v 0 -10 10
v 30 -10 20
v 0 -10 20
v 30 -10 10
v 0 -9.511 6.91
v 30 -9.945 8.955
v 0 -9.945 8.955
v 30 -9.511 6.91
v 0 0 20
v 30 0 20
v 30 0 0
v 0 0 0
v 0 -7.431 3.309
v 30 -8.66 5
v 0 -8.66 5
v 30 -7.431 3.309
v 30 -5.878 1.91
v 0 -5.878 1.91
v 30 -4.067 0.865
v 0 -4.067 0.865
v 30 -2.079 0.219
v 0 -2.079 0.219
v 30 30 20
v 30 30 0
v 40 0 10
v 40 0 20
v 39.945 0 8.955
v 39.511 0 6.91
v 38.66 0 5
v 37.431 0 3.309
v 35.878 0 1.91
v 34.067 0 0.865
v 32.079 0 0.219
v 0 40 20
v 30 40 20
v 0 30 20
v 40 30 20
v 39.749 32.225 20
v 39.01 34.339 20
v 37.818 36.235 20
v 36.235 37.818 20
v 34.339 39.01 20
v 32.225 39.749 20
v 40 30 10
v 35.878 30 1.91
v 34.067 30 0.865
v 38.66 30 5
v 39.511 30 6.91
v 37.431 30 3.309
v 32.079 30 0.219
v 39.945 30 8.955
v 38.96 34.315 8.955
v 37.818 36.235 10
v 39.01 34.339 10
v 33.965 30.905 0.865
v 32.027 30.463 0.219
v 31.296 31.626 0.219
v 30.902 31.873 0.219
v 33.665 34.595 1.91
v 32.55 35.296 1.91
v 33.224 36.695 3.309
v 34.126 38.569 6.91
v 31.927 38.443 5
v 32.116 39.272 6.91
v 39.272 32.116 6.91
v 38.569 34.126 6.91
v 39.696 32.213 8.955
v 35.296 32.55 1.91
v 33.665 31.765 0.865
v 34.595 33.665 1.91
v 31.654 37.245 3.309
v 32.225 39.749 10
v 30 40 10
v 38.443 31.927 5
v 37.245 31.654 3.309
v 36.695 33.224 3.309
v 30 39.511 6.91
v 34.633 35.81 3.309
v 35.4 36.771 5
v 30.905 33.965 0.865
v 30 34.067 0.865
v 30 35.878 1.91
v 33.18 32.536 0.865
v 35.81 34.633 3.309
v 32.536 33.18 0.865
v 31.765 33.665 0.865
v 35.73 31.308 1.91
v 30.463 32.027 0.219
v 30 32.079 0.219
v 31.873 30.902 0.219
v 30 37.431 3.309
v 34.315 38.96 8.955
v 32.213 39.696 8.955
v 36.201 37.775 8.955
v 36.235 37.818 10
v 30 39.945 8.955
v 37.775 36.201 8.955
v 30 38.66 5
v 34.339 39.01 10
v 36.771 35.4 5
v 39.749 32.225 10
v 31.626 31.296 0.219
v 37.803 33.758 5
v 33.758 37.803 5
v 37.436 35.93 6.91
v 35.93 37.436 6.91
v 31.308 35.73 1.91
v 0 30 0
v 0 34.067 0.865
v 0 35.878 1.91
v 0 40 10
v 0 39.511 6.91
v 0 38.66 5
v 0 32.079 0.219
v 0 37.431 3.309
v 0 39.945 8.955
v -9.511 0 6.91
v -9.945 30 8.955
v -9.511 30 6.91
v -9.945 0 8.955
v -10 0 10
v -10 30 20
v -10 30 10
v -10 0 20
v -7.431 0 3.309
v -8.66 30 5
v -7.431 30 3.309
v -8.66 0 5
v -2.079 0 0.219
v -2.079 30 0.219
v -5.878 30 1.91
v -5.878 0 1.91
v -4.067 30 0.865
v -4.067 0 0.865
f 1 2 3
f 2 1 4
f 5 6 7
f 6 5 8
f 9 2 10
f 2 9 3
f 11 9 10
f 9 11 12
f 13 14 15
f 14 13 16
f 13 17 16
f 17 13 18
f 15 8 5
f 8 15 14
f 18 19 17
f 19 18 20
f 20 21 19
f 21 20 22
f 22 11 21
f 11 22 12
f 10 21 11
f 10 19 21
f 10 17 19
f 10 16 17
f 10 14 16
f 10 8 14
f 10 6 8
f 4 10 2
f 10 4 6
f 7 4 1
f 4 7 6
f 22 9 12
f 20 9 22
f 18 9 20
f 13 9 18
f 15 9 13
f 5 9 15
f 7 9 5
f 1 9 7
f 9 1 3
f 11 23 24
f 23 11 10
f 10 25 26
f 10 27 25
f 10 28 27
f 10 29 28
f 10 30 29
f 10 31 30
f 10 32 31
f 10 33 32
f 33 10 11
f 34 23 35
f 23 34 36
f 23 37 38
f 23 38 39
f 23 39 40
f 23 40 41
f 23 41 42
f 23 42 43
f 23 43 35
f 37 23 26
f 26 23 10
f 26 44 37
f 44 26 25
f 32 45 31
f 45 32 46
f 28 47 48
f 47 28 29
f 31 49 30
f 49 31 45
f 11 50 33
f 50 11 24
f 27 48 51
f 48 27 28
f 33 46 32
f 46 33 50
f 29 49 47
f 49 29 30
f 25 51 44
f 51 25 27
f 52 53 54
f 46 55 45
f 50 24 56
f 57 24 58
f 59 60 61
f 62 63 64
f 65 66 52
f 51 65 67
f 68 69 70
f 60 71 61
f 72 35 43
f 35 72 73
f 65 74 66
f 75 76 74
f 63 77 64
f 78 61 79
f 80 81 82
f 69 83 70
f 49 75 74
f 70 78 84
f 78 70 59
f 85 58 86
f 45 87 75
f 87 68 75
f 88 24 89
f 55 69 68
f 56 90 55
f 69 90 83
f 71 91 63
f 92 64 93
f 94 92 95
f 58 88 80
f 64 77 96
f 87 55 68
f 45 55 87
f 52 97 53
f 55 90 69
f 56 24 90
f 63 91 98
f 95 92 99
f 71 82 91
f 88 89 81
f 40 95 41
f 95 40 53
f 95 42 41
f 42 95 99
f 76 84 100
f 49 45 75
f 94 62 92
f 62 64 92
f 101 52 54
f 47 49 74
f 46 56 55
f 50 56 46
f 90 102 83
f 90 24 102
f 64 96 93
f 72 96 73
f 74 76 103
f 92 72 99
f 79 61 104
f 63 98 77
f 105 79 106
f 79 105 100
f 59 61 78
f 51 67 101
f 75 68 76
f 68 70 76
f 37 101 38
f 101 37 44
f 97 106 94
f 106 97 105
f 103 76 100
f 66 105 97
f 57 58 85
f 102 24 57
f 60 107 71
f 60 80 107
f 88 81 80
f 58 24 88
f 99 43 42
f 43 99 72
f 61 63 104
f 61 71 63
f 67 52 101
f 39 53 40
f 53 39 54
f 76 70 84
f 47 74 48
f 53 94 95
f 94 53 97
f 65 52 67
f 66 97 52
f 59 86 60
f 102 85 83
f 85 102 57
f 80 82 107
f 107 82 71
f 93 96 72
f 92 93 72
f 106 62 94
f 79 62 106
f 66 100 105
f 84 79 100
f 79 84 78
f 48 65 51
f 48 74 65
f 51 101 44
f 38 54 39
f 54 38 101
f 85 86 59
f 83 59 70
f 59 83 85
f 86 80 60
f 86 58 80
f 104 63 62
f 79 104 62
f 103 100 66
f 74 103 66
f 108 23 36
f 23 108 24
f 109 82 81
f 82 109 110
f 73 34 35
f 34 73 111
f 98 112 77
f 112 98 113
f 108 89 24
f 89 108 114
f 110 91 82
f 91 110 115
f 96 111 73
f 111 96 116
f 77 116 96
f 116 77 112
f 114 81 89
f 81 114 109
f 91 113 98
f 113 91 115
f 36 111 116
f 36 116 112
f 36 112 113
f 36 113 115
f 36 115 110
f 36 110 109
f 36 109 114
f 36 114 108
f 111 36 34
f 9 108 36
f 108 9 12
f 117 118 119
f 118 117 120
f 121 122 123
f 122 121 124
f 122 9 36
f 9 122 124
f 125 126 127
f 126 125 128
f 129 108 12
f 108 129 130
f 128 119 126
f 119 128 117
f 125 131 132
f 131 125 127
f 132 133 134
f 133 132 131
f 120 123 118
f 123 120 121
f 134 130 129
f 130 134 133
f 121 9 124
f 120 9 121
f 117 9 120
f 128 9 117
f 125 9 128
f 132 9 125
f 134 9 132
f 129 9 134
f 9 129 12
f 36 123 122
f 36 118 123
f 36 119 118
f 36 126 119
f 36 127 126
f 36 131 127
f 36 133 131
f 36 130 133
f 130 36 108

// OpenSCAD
// file: origins.scad
module xzy(){
  multmatrix([
    [1,0,0,0],
    [0,0,1,0],
    [0,1,0,0],
  ]) children();
}

module yxz(){
  multmatrix([
    [0,1,0,0],
    [1,0,0,0],
    [0,0,1,0],
  ]) children();
}

module yzx(){
  multmatrix([
    [0,0,1,0],
    [1,0,0,0],
    [0,1,0,0],
  ]) children();
}

module zxy(){
  multmatrix([
    [0,1,0,0],
    [0,0,1,0],
    [1,0,0,0],
  ]) children();
}

module zyx(){
  multmatrix([
    [0,0,1,0],
    [0,1,0,0],
    [1,0,0,0],
  ]) children();
}
// file: sweep.scad
use <origins.scad>

module sweep(path){
  // straight sections
  for(i=[0:len(path)-2]) let(
    p1=path[i],
    p2=path[i+1],
    seg=p2-p1,
    rz=atan2(seg.y,seg.x),
    l=norm(p2-p1)
  ) {
    translate(p1)rotate([0,0,rz])yzx()linear_extrude(l)scale([-1,1])children();
    if (i < len(path)-2) {
      let(p3=path[i+2], seg2=p3-p2, rz_end=atan2(seg2.y,seg2.x),curve_angle=rz_end > rz ? rz_end-rz : rz_end-rz + 360) {
        translate(p2)rotate([0,0,0])rotate_extrude(angle=curve_angle, start=rz-90)children();
      }
    }
  }
}
// file: poly.scad
FILLET="FILLET";
CHAMFER="CHAMFER";

function fillet(point, r) = [expand_fillet, point, [r]];
function chamfer(point, r) = [expand_chamfer, point, [r]];

function _is_expandable(x) = is_list(x) && len(x) == 3;

function _fa(r) = $fn > 3 ? 360 / $fn : $fa; // TODO: involve $fs

function _point(x) = _is_expandable(x) ? x[1] : x;

function _addVec(v1, v2) = [v1.x + v2.x, v1.y + v2.y];

function _rotatePoint(p, a) = [[cos(a), -sin(a)], [sin(a), cos(a)]] * p;

function _vec(p1, p2) = _addVec(-p1, p2) / norm(_addVec(-p1,p2));

function _alpha(p0, p, p2) = (360 + (atan2(p.y-p2.y, p.x-p2.x) - atan2(p.y-p0.y, p.x-p0.x))) % 360;

function _isLeftCorner(p0, p, p2) = (360 + _alpha(p0, p, p2)) % 360 >= 180;

function _offsetPoint(p, p2, d) = _addVec(p, (_vec(p, p2) * d));

function _filletEnd(pp, p, pn, r) = _offsetPoint(p, pp, abs(r / tan(abs(_alpha(pp, p, pn) / 2))));
function _filletCenter(pp, p, pn, r) = _filletEnd(pp, p, pn, r) + _rotatePoint(_vec(p, pp) * r, _isLeftCorner(pp, p, pn) ? -90 : 90);

function _filletCurveAngle(pp, p, pn) = _alpha(pp, p, pn) > 180 ? _alpha(pp, p, pn) - 180 : 180 - _alpha(pp, p, pn);

function _filletPoint(pp, p, pn, r, angle) = _filletCenter(pp, p, pn, r) + _rotatePoint(_vec(pp, p) * r, _isLeftCorner(pp, p, pn) ? angle - 90 : 90 - angle);

function _expandFillet(p0, p, p2, r) = [
  _filletEnd(p0, p, p2, r),
  each [ for (a = [ _fa(r) : _fa(r) : _filletCurveAngle(p0, p,  p2) ]) _filletPoint(p0, p, p2, r, a) ],
  _filletEnd(p2, p, p0, r),
];

expand_fillet = function (p0, p, p2, params) _expandFillet(p0, p, p2, params[0]);

expand_chamfer = function (p0, p, p2, params) [ _offsetPoint(p, p0, params[0]), _offsetPoint(p, p2, params[0]) ];

function _expand(pp, x, pn) = is_function(x[0]) ? x[0](_point(pp), x[1], _point(pn), x[2]) : [x];


module poly(points, paths = undef, convexity = undef) {
  module basic(ps) {
    actualPoints = [ for (i = [0: len(ps)-1]) each _expand( _point(ps[(i-1+len(ps)) % len(ps)]), ps[i], _point(ps[(i+1) % len(ps)])) ];
    polygon(actualPoints, paths=undef, convexity = convexity);
  }

  module intersect() {
    difference(){
      children(0);
      children(1);
    }
    difference(){
      children(1);
      children(0);
    }
  }

  function path_points(points, path) = [ for (i = path) _is_expandable(i) ? [ i[0], points[i[1]], i[2] ] : points[i] ];

  if (is_undef(paths)) {
    basic(points);
  } else {
    assert(is_list(paths), "paths must be a list");
    for(p = points) {
      assert(is_list(p) && len(p) >=2 && is_num(p.x) && is_num(p.y), "if paths are specified, all points must be vecs");
    }

    if (len(paths) == 1) {
      assert(is_list(paths[0]), "every path must be a list");
      basic(path_points(points, paths[0]));
    } else if (len(paths) > 1) {
      intersect() {
        basic(path_points(points, paths[0]));
        poly(points, [ for (i = [1:1:len(paths)-1]) paths[i] ], convexity);
      }
    }
  }
}
// main file
use <poly.scad>
use <sweep.scad>

POLY=[
  [0,0],
  [30,0],
  [30,30],
  [0,30],
  [0,0],
];

sweep(POLY){
  poly([
    [0,0],
    fillet([10,0],10),
    [10,20],
    [0,20],
  ]);
}

//linear_extrude(20)poly(POLY);
